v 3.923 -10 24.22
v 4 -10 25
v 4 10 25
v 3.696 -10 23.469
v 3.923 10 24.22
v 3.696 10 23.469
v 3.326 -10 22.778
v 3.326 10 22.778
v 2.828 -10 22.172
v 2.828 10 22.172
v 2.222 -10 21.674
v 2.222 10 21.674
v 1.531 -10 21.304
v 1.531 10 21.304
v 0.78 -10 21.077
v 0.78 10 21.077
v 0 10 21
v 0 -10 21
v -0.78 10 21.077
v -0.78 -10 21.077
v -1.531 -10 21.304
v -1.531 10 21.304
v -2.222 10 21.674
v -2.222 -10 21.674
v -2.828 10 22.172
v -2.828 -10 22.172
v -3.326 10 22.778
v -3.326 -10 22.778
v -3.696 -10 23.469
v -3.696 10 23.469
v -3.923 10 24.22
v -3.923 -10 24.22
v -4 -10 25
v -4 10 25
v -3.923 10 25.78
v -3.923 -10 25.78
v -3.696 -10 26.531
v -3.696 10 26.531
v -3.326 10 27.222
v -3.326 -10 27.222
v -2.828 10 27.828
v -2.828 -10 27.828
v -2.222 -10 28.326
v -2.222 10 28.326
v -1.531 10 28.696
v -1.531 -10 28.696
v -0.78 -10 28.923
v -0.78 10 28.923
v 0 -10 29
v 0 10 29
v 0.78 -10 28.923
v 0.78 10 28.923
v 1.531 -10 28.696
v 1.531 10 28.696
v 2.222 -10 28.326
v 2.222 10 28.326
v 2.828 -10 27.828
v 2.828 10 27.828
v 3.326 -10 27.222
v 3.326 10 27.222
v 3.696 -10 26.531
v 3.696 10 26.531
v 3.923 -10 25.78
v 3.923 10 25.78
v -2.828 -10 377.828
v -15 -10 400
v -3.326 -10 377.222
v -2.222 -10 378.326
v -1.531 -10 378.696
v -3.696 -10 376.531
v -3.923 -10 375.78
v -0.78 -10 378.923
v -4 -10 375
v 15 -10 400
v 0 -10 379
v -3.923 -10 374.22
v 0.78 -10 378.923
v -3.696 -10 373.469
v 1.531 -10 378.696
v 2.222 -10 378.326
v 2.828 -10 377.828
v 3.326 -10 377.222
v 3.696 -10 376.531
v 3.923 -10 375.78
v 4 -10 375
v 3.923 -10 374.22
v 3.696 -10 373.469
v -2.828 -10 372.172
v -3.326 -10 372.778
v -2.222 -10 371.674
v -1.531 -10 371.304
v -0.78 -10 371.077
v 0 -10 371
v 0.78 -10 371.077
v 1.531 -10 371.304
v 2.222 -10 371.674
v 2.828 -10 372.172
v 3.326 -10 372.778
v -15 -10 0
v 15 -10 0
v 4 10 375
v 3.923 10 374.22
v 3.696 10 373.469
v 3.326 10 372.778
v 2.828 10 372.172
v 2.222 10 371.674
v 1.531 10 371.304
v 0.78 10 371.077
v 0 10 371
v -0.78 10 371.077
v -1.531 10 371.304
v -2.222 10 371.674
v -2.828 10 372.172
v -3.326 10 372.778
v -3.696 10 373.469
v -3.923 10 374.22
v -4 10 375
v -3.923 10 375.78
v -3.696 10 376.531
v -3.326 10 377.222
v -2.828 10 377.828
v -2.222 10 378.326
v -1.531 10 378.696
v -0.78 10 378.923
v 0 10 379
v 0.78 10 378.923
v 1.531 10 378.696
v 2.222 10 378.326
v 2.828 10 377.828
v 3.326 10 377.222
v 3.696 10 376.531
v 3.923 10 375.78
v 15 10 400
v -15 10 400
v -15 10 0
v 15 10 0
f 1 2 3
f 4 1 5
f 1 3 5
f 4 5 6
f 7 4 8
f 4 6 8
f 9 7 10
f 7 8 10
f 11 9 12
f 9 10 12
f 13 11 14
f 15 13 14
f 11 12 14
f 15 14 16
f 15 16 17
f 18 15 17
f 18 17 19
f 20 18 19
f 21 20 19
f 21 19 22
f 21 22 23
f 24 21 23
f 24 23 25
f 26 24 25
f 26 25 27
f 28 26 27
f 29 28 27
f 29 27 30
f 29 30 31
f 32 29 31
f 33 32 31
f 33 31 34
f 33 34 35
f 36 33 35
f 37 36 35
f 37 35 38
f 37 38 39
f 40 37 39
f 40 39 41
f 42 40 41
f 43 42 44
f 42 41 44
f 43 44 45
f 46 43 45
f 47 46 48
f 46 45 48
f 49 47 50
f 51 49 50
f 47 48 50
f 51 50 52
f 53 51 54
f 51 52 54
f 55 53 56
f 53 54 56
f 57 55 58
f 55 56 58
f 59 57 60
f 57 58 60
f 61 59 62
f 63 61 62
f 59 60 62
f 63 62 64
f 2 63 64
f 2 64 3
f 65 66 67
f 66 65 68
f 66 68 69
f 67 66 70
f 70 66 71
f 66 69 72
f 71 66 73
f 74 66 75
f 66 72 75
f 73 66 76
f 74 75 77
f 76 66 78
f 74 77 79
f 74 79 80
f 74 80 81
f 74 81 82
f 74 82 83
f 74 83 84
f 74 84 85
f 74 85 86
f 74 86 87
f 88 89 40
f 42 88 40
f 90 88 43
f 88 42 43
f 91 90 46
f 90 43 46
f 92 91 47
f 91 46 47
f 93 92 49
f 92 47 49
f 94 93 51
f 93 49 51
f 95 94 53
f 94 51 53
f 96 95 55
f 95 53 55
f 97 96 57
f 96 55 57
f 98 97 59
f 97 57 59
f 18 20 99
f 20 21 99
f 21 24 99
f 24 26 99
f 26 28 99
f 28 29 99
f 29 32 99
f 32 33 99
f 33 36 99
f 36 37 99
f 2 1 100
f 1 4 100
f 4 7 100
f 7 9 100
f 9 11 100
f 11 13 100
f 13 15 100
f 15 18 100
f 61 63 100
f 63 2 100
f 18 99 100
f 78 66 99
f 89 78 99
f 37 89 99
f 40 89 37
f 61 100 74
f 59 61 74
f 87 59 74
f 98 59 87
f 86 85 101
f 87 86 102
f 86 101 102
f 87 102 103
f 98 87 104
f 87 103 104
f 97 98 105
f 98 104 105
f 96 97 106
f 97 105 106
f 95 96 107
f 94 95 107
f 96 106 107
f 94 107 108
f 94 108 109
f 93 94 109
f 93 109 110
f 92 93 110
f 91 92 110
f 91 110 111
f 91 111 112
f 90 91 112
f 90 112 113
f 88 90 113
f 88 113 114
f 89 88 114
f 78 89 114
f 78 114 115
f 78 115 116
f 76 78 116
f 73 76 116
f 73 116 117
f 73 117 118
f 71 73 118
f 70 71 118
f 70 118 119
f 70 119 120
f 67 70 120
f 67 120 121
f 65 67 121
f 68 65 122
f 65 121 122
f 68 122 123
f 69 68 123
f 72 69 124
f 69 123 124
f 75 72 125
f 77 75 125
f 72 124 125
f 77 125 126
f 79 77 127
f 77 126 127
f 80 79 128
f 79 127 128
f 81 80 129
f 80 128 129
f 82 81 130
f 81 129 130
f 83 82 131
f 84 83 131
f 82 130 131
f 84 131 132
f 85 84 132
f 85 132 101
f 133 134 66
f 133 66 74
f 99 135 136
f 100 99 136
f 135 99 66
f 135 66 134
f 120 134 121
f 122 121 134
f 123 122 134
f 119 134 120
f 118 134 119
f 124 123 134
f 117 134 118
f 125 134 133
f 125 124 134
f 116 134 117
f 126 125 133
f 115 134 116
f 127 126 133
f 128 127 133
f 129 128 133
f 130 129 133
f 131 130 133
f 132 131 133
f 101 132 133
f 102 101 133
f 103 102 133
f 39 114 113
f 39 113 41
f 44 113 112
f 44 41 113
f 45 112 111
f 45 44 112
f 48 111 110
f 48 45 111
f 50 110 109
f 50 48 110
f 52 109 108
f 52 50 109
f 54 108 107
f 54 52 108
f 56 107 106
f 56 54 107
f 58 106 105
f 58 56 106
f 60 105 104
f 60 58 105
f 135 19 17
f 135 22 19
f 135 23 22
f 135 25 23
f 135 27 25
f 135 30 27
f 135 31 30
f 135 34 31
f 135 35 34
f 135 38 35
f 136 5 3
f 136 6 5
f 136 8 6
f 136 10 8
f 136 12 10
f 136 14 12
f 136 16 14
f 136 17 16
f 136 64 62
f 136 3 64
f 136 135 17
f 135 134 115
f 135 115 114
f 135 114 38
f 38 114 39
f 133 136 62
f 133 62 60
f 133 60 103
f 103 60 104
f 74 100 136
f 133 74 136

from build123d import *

# Parameters (mm, degrees)
CROQUIS1_W              = 30
CROQUIS1_H              = 20
SALIENTE_EXTRUIR1_DEPTH = 400
CROQUIS2_R              = 4
CORTAR_EXTRUIR1_DEPTH   = 400


with BuildPart() as part:
    # Croquis1 → Saliente-Extruir1 (new body)
    with BuildSketch(Plane.XY):
        Rectangle(CROQUIS1_W, CROQUIS1_H)
    extrude(amount=SALIENTE_EXTRUIR1_DEPTH)

    # Croquis2 → Cortar-Extruir1 (cut)
    with BuildSketch(Plane(origin=(0, 10, 0), x_dir=(1, 0, 0), z_dir=(0, 1, 0))):
        with Locations((0, -375)):
            Circle(CROQUIS2_R)
        with Locations((0, -25)):
            Circle(CROQUIS2_R)
    extrude(amount=-CORTAR_EXTRUIR1_DEPTH, mode=Mode.SUBTRACT)


solid = part.part
